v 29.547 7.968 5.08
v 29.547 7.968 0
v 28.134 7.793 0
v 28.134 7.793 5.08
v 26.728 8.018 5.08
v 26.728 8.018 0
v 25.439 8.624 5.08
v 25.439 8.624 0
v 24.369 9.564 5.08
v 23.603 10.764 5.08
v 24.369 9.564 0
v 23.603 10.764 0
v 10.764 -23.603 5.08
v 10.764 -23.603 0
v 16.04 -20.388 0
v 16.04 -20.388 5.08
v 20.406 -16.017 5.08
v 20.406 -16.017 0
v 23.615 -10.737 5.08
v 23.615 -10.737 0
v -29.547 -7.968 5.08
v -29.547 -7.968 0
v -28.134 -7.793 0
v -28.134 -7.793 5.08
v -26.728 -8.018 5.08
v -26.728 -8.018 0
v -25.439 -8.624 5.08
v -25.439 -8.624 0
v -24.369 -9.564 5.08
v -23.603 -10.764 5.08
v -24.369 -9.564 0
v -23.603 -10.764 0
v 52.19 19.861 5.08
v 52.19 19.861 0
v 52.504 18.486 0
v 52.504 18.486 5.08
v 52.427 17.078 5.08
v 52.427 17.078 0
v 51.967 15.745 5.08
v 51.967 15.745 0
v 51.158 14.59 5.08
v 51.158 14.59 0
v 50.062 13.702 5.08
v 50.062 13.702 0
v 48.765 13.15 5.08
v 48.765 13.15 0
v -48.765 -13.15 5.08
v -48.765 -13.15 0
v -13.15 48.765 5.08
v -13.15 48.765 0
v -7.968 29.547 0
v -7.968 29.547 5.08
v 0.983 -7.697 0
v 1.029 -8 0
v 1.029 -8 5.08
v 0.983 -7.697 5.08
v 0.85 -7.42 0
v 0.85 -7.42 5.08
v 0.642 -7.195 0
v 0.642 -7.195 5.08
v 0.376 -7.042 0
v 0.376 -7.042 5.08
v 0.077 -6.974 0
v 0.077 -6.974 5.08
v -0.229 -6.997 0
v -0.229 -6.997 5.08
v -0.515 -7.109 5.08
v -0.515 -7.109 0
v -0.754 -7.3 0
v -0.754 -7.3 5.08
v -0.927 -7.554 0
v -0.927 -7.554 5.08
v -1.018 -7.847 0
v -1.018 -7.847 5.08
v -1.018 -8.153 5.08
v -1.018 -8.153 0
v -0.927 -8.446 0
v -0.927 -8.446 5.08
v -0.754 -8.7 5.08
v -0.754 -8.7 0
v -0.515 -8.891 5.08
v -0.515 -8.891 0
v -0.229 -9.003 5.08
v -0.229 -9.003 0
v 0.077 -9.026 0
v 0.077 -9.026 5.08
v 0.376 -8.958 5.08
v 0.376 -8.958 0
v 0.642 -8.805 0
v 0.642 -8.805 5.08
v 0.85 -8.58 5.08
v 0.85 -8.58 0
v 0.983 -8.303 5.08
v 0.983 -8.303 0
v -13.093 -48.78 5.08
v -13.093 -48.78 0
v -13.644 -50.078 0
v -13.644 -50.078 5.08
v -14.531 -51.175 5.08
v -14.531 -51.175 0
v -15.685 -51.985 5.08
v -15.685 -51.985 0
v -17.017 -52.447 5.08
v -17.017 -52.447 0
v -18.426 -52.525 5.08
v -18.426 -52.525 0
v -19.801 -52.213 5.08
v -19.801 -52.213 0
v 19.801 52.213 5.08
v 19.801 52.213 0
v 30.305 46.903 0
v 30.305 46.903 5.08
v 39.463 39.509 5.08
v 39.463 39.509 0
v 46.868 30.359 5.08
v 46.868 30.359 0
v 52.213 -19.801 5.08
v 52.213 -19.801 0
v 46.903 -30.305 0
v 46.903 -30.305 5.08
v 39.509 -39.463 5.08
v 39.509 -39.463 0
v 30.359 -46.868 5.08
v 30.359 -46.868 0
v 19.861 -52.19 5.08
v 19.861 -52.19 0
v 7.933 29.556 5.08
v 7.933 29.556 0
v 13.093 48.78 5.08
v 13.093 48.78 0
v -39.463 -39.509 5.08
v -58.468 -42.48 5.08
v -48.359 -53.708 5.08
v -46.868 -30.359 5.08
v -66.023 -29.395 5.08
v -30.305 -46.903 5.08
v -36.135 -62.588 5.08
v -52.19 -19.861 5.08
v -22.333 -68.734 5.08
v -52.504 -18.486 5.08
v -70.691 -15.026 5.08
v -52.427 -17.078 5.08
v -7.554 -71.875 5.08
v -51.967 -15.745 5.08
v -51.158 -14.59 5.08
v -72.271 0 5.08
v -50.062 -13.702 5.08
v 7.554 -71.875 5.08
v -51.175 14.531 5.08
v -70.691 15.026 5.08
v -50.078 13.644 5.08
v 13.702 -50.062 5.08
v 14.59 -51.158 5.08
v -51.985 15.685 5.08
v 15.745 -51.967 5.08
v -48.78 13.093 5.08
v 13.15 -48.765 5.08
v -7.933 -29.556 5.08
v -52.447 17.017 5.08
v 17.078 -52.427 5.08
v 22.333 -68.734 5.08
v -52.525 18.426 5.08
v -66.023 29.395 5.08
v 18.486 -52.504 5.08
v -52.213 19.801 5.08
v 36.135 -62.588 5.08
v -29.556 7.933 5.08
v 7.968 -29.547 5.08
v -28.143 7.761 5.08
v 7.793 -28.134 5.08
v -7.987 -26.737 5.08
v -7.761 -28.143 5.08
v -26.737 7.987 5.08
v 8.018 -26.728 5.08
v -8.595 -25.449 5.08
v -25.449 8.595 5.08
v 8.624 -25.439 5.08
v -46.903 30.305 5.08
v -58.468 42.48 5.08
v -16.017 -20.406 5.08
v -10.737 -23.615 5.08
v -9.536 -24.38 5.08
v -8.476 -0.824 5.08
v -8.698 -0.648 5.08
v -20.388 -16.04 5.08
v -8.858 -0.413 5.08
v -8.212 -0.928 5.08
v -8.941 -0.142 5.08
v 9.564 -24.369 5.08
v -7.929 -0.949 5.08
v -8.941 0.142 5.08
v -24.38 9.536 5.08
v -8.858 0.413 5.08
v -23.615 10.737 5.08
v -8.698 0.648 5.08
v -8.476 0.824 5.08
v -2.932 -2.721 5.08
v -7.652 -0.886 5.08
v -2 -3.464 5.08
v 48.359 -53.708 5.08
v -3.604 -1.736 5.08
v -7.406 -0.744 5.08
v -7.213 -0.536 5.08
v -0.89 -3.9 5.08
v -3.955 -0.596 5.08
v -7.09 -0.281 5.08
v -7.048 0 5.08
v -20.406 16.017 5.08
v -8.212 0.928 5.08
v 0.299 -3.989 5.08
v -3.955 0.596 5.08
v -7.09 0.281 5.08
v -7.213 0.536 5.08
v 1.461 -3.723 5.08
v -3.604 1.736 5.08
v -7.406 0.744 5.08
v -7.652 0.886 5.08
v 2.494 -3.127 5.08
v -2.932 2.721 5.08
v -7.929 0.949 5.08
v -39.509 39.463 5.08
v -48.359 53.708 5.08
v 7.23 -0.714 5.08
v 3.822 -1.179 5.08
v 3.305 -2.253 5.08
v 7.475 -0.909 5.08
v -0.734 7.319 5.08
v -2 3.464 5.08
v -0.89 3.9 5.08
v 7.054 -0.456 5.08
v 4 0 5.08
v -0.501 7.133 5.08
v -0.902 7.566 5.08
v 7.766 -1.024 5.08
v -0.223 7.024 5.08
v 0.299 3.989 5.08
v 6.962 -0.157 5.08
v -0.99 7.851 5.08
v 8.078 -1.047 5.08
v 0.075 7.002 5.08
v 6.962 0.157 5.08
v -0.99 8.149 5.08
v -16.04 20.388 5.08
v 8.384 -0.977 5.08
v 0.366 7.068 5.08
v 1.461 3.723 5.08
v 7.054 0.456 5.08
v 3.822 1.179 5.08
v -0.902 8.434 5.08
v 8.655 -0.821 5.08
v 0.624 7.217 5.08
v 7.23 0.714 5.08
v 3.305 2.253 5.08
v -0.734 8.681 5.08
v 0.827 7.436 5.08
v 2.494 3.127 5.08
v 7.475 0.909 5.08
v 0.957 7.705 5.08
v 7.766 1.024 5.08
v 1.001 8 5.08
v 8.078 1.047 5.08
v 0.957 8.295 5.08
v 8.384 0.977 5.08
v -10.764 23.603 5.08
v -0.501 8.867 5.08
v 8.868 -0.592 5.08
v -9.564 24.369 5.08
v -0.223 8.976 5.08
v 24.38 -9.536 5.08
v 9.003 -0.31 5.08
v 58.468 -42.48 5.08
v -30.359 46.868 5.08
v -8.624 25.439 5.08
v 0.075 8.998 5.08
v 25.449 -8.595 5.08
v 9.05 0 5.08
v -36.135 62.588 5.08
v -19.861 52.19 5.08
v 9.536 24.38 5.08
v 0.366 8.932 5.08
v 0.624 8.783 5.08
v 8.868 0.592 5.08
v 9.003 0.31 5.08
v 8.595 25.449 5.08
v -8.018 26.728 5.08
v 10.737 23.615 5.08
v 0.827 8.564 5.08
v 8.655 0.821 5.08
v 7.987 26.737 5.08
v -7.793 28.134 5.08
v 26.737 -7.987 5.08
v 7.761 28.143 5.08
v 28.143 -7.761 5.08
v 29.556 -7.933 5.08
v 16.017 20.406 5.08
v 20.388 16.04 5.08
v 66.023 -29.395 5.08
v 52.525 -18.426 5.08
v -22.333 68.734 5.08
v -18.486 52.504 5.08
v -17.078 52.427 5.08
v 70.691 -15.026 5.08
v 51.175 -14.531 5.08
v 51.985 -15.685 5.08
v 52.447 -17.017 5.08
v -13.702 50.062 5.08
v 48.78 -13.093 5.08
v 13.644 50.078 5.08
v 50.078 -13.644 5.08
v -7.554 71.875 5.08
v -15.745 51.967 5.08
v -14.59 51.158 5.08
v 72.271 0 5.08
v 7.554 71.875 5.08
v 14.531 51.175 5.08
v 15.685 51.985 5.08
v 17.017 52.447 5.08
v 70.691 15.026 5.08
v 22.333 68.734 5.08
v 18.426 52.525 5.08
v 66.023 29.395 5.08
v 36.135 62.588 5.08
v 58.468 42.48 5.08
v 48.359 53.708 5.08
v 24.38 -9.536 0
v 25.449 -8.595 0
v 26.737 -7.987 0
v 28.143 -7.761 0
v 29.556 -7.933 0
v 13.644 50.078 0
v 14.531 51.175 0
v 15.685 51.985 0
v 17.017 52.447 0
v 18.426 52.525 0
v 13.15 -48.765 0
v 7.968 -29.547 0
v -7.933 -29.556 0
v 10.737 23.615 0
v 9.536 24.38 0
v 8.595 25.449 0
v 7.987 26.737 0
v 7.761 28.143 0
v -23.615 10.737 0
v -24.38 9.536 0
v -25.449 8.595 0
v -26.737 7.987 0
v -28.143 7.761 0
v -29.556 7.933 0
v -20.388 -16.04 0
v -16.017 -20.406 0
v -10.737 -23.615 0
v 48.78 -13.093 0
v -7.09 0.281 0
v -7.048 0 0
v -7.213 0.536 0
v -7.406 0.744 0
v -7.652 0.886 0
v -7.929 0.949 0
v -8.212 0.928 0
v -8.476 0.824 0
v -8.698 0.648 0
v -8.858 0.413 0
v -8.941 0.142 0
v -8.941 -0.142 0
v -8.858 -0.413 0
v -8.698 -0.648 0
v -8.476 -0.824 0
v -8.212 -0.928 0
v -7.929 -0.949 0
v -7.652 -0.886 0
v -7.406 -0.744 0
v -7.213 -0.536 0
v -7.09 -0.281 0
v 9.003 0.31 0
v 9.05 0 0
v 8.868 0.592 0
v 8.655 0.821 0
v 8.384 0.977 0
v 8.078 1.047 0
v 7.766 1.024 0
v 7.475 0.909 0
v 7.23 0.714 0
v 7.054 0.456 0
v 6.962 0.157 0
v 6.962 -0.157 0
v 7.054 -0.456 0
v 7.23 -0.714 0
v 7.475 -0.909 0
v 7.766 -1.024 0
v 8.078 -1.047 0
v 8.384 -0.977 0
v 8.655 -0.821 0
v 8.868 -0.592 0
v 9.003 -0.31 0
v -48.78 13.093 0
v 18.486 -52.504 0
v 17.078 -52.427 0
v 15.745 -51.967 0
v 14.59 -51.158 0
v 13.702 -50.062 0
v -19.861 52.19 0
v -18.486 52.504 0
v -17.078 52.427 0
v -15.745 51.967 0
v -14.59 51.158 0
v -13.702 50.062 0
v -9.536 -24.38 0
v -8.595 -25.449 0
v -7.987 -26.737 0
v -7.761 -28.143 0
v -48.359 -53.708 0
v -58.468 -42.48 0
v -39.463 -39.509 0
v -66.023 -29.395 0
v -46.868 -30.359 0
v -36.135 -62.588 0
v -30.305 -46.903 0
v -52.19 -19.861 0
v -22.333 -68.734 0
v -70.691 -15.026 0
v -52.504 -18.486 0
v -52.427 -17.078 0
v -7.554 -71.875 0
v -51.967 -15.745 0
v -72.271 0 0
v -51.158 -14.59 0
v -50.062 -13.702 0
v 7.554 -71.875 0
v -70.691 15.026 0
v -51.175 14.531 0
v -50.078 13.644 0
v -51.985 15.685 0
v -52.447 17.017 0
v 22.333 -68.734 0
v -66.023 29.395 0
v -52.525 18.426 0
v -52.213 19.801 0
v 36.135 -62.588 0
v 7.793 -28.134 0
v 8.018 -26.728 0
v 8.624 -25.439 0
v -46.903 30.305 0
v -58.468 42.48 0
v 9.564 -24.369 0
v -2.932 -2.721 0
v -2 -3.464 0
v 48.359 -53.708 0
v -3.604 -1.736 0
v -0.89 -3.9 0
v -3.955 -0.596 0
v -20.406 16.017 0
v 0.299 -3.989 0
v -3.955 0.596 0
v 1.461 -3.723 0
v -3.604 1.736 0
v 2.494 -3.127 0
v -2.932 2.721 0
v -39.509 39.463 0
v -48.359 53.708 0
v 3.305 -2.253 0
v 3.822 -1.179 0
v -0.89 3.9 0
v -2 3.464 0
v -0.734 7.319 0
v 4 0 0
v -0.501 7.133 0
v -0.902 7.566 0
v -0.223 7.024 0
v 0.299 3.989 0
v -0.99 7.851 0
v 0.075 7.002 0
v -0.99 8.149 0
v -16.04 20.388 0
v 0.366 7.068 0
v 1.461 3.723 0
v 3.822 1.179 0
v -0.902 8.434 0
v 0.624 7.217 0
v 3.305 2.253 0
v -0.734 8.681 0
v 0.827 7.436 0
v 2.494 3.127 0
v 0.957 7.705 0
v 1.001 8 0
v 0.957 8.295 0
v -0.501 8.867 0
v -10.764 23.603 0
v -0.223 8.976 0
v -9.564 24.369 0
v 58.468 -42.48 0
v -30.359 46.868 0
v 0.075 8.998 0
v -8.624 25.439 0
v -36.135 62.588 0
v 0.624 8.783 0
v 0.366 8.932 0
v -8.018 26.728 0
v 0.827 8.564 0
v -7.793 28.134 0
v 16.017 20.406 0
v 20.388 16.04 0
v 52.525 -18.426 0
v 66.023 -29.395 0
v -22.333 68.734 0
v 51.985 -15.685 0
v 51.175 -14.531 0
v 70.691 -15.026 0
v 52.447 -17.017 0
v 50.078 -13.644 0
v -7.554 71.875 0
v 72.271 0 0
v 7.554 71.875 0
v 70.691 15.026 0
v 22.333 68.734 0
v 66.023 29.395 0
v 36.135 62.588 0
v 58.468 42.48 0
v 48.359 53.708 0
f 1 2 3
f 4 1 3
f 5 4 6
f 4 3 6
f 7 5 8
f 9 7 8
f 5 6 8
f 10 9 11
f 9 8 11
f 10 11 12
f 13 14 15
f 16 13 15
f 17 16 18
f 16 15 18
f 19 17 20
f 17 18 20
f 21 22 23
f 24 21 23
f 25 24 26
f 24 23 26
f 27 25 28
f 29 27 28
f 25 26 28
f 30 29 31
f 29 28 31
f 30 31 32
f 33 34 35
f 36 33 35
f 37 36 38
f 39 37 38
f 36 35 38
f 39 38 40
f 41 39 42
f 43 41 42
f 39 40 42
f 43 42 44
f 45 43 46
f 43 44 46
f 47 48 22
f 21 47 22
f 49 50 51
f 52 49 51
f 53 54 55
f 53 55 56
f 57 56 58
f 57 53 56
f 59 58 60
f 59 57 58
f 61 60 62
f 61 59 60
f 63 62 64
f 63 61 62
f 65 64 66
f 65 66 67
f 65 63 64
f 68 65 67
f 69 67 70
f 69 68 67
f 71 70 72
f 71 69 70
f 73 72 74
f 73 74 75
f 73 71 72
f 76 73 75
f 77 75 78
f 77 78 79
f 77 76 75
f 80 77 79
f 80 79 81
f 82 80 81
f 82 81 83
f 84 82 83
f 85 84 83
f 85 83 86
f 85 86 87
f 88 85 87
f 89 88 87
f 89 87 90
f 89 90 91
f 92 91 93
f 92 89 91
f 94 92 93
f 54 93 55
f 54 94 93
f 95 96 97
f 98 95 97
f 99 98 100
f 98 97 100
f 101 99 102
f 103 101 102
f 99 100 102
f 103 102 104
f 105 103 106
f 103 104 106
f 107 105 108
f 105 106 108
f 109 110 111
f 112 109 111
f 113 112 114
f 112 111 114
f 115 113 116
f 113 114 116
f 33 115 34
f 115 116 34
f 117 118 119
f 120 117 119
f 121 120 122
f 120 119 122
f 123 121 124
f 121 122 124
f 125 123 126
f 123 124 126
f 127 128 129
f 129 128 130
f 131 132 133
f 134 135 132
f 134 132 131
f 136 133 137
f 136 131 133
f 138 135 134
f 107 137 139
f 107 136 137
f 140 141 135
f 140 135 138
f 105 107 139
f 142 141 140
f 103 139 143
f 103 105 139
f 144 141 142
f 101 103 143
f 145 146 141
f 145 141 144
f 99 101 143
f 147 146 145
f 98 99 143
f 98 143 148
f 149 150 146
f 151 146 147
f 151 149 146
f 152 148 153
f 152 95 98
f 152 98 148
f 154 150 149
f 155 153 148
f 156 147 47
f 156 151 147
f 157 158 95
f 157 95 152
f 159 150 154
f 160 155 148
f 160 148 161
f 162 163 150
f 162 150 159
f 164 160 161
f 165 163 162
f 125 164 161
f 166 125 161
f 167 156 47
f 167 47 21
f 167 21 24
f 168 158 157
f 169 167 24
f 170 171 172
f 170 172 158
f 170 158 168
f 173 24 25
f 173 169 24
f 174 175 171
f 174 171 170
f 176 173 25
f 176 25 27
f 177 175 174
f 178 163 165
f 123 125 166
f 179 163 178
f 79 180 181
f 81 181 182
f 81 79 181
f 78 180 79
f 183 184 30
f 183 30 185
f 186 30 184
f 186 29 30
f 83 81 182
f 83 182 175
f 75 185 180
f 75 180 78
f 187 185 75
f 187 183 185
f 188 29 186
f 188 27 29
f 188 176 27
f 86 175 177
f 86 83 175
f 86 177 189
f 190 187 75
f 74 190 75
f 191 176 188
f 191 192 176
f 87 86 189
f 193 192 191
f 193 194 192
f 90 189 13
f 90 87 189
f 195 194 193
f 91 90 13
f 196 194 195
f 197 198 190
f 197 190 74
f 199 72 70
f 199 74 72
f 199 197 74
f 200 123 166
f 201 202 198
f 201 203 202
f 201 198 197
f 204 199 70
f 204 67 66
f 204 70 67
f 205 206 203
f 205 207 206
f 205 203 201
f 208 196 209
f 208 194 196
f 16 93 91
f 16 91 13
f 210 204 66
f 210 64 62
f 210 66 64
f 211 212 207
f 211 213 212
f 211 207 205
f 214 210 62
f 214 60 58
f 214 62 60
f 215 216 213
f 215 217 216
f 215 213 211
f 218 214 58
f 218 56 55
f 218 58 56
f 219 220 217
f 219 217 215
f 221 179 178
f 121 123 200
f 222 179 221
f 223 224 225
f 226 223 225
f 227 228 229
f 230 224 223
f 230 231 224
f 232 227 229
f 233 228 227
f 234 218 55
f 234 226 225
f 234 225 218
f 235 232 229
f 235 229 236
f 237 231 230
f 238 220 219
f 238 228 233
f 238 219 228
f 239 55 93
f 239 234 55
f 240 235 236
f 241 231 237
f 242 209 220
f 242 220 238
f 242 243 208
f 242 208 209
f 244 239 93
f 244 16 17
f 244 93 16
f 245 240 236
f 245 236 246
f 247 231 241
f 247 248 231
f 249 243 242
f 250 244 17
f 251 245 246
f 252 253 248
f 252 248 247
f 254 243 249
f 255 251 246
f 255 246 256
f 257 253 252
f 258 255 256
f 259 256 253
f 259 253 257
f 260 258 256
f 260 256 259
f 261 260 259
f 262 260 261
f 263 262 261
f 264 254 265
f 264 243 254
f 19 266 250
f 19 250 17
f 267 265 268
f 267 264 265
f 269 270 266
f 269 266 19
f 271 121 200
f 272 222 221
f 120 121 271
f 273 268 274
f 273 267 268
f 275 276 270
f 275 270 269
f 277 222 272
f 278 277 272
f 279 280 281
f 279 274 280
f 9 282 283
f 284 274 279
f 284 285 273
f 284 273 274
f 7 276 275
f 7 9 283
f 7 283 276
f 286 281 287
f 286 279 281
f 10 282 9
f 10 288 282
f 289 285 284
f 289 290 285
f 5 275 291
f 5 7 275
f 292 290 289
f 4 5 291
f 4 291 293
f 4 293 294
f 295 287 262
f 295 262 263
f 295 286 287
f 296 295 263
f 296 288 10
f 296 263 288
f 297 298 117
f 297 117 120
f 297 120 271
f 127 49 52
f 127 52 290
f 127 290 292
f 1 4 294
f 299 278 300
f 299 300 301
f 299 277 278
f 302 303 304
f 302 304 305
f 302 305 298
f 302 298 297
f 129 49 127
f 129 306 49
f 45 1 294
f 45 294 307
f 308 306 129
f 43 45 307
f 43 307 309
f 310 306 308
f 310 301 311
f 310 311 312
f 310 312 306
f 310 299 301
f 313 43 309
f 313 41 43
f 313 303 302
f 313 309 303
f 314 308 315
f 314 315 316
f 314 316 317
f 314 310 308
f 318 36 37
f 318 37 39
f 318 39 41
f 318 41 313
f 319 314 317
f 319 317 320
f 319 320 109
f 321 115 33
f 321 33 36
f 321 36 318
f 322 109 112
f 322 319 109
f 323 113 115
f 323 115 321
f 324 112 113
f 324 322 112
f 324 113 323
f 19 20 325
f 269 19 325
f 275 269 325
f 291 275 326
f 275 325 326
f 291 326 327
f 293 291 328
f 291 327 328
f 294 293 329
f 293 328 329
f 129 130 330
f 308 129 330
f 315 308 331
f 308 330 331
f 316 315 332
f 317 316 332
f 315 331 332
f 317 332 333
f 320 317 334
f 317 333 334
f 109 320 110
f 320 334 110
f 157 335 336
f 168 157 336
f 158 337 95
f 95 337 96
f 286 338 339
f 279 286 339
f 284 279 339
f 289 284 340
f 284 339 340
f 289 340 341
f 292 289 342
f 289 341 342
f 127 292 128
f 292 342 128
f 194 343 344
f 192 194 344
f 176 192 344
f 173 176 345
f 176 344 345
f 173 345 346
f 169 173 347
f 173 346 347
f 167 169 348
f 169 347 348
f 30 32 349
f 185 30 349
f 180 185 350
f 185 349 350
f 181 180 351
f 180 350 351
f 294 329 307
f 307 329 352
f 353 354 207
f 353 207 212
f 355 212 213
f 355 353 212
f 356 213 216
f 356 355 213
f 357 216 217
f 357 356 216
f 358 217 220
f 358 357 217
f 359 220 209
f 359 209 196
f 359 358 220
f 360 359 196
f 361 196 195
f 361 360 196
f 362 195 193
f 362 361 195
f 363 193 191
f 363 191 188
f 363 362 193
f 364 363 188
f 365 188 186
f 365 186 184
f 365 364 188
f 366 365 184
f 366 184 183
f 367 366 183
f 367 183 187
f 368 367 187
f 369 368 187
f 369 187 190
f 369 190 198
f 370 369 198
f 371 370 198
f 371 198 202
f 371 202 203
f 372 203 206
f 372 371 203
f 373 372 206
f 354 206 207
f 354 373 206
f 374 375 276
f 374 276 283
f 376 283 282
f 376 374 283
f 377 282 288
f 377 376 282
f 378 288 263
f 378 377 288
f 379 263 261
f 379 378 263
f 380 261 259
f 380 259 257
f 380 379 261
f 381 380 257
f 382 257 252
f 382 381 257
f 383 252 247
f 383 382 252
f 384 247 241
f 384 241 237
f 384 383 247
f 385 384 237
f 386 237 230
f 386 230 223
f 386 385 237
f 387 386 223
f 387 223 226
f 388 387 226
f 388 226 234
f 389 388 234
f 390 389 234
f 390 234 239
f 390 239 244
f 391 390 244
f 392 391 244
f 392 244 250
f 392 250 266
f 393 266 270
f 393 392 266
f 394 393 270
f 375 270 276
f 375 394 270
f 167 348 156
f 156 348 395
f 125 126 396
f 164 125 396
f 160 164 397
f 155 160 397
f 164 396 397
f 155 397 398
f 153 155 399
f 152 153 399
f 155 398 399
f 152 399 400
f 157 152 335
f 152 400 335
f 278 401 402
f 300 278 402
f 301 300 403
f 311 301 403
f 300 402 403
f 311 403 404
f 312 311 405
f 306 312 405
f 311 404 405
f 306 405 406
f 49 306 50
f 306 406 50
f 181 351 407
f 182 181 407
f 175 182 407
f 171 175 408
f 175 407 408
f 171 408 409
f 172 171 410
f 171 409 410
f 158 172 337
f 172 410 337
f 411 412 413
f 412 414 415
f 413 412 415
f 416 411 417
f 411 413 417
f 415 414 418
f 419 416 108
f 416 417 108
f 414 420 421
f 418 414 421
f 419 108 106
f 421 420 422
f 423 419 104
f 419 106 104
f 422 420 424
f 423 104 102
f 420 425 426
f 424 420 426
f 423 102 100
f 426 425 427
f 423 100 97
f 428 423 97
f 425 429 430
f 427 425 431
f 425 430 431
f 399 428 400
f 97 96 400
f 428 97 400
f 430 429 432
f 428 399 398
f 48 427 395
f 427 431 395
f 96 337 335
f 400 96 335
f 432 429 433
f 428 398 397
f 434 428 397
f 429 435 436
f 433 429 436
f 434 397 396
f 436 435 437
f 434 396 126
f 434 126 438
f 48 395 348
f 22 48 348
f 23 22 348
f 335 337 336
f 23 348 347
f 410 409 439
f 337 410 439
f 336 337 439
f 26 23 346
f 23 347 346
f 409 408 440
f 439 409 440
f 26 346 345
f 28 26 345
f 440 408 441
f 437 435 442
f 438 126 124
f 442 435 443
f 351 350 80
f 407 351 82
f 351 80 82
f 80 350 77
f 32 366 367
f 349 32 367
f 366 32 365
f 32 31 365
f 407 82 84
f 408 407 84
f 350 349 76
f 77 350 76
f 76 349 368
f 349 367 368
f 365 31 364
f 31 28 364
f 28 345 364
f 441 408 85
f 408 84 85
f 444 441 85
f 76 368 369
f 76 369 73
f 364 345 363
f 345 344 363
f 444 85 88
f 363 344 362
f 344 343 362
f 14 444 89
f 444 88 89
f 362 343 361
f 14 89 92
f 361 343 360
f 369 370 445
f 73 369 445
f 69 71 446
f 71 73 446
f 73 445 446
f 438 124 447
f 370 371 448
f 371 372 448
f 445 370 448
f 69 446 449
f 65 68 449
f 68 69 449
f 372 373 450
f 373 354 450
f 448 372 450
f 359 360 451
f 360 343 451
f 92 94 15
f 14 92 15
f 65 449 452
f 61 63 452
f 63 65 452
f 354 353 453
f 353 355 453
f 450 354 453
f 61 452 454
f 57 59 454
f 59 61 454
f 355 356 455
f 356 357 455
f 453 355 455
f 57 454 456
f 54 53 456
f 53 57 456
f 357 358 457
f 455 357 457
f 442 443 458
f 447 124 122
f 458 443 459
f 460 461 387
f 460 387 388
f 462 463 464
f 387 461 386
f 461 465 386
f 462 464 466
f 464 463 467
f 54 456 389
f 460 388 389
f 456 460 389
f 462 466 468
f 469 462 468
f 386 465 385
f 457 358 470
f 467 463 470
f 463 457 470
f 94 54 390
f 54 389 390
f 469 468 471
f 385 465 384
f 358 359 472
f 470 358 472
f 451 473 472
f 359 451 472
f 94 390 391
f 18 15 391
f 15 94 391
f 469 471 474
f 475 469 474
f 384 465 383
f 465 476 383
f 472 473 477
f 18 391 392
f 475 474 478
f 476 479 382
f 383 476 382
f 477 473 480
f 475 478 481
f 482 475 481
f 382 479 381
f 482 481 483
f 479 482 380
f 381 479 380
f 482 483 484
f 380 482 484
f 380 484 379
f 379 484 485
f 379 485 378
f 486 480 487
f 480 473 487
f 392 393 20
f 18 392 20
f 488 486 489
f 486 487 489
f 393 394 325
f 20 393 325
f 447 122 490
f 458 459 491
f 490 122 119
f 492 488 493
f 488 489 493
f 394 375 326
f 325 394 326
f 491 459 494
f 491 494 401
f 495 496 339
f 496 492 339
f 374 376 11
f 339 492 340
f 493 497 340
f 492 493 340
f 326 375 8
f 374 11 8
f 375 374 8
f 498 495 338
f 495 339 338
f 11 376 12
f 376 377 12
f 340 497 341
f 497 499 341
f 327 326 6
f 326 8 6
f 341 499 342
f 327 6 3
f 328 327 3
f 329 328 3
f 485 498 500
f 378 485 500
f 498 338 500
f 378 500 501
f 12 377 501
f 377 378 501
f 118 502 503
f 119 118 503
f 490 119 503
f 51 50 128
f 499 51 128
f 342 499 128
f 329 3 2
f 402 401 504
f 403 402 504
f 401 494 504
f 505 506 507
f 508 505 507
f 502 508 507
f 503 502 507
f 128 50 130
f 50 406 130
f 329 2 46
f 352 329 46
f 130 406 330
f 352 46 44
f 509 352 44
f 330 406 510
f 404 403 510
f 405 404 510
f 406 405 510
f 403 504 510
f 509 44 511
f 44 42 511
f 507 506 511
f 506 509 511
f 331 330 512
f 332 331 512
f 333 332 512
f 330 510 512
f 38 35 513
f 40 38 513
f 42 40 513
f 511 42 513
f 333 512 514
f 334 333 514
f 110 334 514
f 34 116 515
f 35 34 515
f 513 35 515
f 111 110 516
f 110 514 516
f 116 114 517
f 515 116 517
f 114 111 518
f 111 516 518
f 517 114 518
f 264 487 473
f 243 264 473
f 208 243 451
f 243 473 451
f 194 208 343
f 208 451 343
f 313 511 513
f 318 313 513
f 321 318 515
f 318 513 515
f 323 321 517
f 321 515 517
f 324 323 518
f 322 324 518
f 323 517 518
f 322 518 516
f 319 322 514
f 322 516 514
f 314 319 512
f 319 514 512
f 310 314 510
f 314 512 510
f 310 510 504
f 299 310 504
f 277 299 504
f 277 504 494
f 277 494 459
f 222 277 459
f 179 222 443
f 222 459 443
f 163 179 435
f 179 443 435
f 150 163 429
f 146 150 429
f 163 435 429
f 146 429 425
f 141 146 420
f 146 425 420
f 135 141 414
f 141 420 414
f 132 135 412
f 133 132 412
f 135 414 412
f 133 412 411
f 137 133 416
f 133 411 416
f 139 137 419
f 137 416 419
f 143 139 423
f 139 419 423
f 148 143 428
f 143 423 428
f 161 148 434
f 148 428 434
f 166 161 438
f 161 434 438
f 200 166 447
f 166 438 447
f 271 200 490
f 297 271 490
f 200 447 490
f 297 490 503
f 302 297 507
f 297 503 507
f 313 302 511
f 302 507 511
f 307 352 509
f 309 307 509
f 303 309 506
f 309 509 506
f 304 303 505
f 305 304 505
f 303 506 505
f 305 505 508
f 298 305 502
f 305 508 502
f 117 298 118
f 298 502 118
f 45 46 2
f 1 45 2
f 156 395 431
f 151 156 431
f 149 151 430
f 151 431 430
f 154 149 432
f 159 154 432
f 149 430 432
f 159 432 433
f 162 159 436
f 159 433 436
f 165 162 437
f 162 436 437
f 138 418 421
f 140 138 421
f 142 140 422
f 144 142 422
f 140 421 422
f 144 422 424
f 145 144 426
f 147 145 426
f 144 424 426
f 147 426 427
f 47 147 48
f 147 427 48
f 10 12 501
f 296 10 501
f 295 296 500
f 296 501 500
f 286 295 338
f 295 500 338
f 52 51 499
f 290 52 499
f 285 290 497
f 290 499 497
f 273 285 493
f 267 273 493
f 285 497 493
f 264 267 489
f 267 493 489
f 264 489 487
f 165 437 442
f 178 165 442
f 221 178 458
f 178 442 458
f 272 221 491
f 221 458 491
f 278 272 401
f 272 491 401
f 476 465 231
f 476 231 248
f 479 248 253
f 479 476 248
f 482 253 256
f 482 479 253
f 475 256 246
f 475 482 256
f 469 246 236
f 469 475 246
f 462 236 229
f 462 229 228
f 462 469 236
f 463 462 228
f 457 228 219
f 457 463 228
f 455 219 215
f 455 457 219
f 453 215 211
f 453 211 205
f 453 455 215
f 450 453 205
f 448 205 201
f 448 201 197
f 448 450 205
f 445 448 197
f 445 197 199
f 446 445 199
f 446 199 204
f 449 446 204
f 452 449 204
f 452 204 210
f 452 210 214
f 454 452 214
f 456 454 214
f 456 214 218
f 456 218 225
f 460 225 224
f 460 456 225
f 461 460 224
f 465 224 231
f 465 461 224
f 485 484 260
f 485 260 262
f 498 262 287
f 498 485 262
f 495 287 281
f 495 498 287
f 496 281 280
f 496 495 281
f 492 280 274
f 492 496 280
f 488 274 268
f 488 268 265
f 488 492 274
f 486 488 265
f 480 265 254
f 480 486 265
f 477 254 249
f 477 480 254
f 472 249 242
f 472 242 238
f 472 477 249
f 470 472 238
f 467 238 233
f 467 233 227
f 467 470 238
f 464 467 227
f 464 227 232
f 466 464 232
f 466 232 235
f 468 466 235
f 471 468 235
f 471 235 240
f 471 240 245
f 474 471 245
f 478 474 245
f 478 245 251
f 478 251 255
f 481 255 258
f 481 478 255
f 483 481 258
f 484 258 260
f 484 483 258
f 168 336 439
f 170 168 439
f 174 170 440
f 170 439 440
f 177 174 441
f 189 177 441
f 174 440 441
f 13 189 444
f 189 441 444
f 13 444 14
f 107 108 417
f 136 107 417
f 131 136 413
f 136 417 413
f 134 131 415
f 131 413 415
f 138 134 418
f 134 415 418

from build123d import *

# Parameters (mm, degrees)
SKETCH1_R           = 72.270783293
SKETCH1_R_2         = 1.029023024
SKETCH1_R_3         = 0.951973647
SKETCH1_R_4         = 4
SKETCH1_R_5         = 1.050065139
SKETCH1_R_6         = 1.001019393
BOSS_EXTRUDE1_DEPTH = 5.08


with BuildPart() as part:
    # Sketch1 → Boss-Extrude1 (new body)
    with BuildSketch(Plane.XY):
        Circle(SKETCH1_R)
        with BuildLine():
            ThreePointArc((-10.737087643, -23.615107406), (-8.245531622, -26.07156763), (-7.93335155, -29.556476789))
            Line((-7.93335155, -29.556476789), (-13.09319037, -48.779960759))
            ThreePointArc((-13.09319037, -48.779960759), (-15.685085812, -51.985178513), (-19.800843937, -52.212945683))
            ThreePointArc((-19.800843937, -52.212945683), (-39.462982159, -39.508709884), (-52.189979739, -19.86129735))
            ThreePointArc((-52.189979739, -19.86129735), (-51.966979092, -15.745278212), (-48.764765106, -13.149672615))
            Line((-48.764765106, -13.149672615), (-29.547269525, -7.967574951))
            ThreePointArc((-29.547269525, -7.967574951), (-26.062001174, -8.275719015), (-23.60265718, -10.764428592))
            ThreePointArc((-23.60265718, -10.764428592), (-18.33274407, -18.353987134), (-10.737087643, -23.615107406))
        make_face(mode=Mode.SUBTRACT)
        with BuildLine():
            ThreePointArc((23.615107406, -10.737087643), (26.07156763, -8.245531622), (29.556476789, -7.93335155))
            Line((29.556476789, -7.93335155), (48.779960759, -13.09319037))
            ThreePointArc((48.779960759, -13.09319037), (51.985178513, -15.685085812), (52.212945683, -19.800843937))
            ThreePointArc((52.212945683, -19.800843937), (39.508709884, -39.462982159), (19.86129735, -52.189979739))
            ThreePointArc((19.86129735, -52.189979739), (15.745278212, -51.966979092), (13.149672615, -48.764765106))
            Line((13.149672615, -48.764765106), (7.967574951, -29.547269525))
            ThreePointArc((7.967574951, -29.547269525), (8.275719015, -26.062001174), (10.764428592, -23.60265718))
            ThreePointArc((10.764428592, -23.60265718), (18.353987134, -18.33274407), (23.615107406, -10.737087643))
        make_face(mode=Mode.SUBTRACT)
        with Locations((0, -8)):
            Circle(SKETCH1_R_2, mode=Mode.SUBTRACT)
        with Locations((-8, 0)):
            Circle(SKETCH1_R_3, mode=Mode.SUBTRACT)
        with BuildLine():
            ThreePointArc((-23.615107406, 10.737087643), (-26.07156763, 8.245531622), (-29.556476789, 7.93335155))
            Line((-29.556476789, 7.93335155), (-48.779960759, 13.09319037))
            ThreePointArc((-48.779960759, 13.09319037), (-51.985178513, 15.685085812), (-52.212945683, 19.800843937))
            ThreePointArc((-52.212945683, 19.800843937), (-39.508709884, 39.462982159), (-19.86129735, 52.189979739))
            ThreePointArc((-19.86129735, 52.189979739), (-15.745278212, 51.966979092), (-13.149672615, 48.764765106))
            Line((-13.149672615, 48.764765106), (-7.967574951, 29.547269525))
            ThreePointArc((-7.967574951, 29.547269525), (-8.275719015, 26.062001174), (-10.764428592, 23.60265718))
            ThreePointArc((-10.764428592, 23.60265718), (-18.353987134, 18.33274407), (-23.615107406, 10.737087643))
        make_face(mode=Mode.SUBTRACT)
        Circle(SKETCH1_R_4, mode=Mode.SUBTRACT)
        with Locations((8, 0)):
            Circle(SKETCH1_R_5, mode=Mode.SUBTRACT)
        with Locations((0, 8)):
            Circle(SKETCH1_R_6, mode=Mode.SUBTRACT)
        with BuildLine():
            ThreePointArc((10.737087643, 23.615107406), (8.245531622, 26.07156763), (7.93335155, 29.556476789))
            Line((7.93335155, 29.556476789), (13.09319037, 48.779960759))
            ThreePointArc((13.09319037, 48.779960759), (15.685085812, 51.985178513), (19.800843937, 52.212945683))
            ThreePointArc((19.800843937, 52.212945683), (39.462982159, 39.508709884), (52.189979739, 19.86129735))
            ThreePointArc((52.189979739, 19.86129735), (51.966979092, 15.745278212), (48.764765106, 13.149672615))
            Line((48.764765106, 13.149672615), (29.547269525, 7.967574951))
            ThreePointArc((29.547269525, 7.967574951), (26.062001174, 8.275719015), (23.60265718, 10.764428592))
            ThreePointArc((23.60265718, 10.764428592), (18.33274407, 18.353987134), (10.737087643, 23.615107406))
        make_face(mode=Mode.SUBTRACT)
    extrude(amount=BOSS_EXTRUDE1_DEPTH)


solid = part.part
